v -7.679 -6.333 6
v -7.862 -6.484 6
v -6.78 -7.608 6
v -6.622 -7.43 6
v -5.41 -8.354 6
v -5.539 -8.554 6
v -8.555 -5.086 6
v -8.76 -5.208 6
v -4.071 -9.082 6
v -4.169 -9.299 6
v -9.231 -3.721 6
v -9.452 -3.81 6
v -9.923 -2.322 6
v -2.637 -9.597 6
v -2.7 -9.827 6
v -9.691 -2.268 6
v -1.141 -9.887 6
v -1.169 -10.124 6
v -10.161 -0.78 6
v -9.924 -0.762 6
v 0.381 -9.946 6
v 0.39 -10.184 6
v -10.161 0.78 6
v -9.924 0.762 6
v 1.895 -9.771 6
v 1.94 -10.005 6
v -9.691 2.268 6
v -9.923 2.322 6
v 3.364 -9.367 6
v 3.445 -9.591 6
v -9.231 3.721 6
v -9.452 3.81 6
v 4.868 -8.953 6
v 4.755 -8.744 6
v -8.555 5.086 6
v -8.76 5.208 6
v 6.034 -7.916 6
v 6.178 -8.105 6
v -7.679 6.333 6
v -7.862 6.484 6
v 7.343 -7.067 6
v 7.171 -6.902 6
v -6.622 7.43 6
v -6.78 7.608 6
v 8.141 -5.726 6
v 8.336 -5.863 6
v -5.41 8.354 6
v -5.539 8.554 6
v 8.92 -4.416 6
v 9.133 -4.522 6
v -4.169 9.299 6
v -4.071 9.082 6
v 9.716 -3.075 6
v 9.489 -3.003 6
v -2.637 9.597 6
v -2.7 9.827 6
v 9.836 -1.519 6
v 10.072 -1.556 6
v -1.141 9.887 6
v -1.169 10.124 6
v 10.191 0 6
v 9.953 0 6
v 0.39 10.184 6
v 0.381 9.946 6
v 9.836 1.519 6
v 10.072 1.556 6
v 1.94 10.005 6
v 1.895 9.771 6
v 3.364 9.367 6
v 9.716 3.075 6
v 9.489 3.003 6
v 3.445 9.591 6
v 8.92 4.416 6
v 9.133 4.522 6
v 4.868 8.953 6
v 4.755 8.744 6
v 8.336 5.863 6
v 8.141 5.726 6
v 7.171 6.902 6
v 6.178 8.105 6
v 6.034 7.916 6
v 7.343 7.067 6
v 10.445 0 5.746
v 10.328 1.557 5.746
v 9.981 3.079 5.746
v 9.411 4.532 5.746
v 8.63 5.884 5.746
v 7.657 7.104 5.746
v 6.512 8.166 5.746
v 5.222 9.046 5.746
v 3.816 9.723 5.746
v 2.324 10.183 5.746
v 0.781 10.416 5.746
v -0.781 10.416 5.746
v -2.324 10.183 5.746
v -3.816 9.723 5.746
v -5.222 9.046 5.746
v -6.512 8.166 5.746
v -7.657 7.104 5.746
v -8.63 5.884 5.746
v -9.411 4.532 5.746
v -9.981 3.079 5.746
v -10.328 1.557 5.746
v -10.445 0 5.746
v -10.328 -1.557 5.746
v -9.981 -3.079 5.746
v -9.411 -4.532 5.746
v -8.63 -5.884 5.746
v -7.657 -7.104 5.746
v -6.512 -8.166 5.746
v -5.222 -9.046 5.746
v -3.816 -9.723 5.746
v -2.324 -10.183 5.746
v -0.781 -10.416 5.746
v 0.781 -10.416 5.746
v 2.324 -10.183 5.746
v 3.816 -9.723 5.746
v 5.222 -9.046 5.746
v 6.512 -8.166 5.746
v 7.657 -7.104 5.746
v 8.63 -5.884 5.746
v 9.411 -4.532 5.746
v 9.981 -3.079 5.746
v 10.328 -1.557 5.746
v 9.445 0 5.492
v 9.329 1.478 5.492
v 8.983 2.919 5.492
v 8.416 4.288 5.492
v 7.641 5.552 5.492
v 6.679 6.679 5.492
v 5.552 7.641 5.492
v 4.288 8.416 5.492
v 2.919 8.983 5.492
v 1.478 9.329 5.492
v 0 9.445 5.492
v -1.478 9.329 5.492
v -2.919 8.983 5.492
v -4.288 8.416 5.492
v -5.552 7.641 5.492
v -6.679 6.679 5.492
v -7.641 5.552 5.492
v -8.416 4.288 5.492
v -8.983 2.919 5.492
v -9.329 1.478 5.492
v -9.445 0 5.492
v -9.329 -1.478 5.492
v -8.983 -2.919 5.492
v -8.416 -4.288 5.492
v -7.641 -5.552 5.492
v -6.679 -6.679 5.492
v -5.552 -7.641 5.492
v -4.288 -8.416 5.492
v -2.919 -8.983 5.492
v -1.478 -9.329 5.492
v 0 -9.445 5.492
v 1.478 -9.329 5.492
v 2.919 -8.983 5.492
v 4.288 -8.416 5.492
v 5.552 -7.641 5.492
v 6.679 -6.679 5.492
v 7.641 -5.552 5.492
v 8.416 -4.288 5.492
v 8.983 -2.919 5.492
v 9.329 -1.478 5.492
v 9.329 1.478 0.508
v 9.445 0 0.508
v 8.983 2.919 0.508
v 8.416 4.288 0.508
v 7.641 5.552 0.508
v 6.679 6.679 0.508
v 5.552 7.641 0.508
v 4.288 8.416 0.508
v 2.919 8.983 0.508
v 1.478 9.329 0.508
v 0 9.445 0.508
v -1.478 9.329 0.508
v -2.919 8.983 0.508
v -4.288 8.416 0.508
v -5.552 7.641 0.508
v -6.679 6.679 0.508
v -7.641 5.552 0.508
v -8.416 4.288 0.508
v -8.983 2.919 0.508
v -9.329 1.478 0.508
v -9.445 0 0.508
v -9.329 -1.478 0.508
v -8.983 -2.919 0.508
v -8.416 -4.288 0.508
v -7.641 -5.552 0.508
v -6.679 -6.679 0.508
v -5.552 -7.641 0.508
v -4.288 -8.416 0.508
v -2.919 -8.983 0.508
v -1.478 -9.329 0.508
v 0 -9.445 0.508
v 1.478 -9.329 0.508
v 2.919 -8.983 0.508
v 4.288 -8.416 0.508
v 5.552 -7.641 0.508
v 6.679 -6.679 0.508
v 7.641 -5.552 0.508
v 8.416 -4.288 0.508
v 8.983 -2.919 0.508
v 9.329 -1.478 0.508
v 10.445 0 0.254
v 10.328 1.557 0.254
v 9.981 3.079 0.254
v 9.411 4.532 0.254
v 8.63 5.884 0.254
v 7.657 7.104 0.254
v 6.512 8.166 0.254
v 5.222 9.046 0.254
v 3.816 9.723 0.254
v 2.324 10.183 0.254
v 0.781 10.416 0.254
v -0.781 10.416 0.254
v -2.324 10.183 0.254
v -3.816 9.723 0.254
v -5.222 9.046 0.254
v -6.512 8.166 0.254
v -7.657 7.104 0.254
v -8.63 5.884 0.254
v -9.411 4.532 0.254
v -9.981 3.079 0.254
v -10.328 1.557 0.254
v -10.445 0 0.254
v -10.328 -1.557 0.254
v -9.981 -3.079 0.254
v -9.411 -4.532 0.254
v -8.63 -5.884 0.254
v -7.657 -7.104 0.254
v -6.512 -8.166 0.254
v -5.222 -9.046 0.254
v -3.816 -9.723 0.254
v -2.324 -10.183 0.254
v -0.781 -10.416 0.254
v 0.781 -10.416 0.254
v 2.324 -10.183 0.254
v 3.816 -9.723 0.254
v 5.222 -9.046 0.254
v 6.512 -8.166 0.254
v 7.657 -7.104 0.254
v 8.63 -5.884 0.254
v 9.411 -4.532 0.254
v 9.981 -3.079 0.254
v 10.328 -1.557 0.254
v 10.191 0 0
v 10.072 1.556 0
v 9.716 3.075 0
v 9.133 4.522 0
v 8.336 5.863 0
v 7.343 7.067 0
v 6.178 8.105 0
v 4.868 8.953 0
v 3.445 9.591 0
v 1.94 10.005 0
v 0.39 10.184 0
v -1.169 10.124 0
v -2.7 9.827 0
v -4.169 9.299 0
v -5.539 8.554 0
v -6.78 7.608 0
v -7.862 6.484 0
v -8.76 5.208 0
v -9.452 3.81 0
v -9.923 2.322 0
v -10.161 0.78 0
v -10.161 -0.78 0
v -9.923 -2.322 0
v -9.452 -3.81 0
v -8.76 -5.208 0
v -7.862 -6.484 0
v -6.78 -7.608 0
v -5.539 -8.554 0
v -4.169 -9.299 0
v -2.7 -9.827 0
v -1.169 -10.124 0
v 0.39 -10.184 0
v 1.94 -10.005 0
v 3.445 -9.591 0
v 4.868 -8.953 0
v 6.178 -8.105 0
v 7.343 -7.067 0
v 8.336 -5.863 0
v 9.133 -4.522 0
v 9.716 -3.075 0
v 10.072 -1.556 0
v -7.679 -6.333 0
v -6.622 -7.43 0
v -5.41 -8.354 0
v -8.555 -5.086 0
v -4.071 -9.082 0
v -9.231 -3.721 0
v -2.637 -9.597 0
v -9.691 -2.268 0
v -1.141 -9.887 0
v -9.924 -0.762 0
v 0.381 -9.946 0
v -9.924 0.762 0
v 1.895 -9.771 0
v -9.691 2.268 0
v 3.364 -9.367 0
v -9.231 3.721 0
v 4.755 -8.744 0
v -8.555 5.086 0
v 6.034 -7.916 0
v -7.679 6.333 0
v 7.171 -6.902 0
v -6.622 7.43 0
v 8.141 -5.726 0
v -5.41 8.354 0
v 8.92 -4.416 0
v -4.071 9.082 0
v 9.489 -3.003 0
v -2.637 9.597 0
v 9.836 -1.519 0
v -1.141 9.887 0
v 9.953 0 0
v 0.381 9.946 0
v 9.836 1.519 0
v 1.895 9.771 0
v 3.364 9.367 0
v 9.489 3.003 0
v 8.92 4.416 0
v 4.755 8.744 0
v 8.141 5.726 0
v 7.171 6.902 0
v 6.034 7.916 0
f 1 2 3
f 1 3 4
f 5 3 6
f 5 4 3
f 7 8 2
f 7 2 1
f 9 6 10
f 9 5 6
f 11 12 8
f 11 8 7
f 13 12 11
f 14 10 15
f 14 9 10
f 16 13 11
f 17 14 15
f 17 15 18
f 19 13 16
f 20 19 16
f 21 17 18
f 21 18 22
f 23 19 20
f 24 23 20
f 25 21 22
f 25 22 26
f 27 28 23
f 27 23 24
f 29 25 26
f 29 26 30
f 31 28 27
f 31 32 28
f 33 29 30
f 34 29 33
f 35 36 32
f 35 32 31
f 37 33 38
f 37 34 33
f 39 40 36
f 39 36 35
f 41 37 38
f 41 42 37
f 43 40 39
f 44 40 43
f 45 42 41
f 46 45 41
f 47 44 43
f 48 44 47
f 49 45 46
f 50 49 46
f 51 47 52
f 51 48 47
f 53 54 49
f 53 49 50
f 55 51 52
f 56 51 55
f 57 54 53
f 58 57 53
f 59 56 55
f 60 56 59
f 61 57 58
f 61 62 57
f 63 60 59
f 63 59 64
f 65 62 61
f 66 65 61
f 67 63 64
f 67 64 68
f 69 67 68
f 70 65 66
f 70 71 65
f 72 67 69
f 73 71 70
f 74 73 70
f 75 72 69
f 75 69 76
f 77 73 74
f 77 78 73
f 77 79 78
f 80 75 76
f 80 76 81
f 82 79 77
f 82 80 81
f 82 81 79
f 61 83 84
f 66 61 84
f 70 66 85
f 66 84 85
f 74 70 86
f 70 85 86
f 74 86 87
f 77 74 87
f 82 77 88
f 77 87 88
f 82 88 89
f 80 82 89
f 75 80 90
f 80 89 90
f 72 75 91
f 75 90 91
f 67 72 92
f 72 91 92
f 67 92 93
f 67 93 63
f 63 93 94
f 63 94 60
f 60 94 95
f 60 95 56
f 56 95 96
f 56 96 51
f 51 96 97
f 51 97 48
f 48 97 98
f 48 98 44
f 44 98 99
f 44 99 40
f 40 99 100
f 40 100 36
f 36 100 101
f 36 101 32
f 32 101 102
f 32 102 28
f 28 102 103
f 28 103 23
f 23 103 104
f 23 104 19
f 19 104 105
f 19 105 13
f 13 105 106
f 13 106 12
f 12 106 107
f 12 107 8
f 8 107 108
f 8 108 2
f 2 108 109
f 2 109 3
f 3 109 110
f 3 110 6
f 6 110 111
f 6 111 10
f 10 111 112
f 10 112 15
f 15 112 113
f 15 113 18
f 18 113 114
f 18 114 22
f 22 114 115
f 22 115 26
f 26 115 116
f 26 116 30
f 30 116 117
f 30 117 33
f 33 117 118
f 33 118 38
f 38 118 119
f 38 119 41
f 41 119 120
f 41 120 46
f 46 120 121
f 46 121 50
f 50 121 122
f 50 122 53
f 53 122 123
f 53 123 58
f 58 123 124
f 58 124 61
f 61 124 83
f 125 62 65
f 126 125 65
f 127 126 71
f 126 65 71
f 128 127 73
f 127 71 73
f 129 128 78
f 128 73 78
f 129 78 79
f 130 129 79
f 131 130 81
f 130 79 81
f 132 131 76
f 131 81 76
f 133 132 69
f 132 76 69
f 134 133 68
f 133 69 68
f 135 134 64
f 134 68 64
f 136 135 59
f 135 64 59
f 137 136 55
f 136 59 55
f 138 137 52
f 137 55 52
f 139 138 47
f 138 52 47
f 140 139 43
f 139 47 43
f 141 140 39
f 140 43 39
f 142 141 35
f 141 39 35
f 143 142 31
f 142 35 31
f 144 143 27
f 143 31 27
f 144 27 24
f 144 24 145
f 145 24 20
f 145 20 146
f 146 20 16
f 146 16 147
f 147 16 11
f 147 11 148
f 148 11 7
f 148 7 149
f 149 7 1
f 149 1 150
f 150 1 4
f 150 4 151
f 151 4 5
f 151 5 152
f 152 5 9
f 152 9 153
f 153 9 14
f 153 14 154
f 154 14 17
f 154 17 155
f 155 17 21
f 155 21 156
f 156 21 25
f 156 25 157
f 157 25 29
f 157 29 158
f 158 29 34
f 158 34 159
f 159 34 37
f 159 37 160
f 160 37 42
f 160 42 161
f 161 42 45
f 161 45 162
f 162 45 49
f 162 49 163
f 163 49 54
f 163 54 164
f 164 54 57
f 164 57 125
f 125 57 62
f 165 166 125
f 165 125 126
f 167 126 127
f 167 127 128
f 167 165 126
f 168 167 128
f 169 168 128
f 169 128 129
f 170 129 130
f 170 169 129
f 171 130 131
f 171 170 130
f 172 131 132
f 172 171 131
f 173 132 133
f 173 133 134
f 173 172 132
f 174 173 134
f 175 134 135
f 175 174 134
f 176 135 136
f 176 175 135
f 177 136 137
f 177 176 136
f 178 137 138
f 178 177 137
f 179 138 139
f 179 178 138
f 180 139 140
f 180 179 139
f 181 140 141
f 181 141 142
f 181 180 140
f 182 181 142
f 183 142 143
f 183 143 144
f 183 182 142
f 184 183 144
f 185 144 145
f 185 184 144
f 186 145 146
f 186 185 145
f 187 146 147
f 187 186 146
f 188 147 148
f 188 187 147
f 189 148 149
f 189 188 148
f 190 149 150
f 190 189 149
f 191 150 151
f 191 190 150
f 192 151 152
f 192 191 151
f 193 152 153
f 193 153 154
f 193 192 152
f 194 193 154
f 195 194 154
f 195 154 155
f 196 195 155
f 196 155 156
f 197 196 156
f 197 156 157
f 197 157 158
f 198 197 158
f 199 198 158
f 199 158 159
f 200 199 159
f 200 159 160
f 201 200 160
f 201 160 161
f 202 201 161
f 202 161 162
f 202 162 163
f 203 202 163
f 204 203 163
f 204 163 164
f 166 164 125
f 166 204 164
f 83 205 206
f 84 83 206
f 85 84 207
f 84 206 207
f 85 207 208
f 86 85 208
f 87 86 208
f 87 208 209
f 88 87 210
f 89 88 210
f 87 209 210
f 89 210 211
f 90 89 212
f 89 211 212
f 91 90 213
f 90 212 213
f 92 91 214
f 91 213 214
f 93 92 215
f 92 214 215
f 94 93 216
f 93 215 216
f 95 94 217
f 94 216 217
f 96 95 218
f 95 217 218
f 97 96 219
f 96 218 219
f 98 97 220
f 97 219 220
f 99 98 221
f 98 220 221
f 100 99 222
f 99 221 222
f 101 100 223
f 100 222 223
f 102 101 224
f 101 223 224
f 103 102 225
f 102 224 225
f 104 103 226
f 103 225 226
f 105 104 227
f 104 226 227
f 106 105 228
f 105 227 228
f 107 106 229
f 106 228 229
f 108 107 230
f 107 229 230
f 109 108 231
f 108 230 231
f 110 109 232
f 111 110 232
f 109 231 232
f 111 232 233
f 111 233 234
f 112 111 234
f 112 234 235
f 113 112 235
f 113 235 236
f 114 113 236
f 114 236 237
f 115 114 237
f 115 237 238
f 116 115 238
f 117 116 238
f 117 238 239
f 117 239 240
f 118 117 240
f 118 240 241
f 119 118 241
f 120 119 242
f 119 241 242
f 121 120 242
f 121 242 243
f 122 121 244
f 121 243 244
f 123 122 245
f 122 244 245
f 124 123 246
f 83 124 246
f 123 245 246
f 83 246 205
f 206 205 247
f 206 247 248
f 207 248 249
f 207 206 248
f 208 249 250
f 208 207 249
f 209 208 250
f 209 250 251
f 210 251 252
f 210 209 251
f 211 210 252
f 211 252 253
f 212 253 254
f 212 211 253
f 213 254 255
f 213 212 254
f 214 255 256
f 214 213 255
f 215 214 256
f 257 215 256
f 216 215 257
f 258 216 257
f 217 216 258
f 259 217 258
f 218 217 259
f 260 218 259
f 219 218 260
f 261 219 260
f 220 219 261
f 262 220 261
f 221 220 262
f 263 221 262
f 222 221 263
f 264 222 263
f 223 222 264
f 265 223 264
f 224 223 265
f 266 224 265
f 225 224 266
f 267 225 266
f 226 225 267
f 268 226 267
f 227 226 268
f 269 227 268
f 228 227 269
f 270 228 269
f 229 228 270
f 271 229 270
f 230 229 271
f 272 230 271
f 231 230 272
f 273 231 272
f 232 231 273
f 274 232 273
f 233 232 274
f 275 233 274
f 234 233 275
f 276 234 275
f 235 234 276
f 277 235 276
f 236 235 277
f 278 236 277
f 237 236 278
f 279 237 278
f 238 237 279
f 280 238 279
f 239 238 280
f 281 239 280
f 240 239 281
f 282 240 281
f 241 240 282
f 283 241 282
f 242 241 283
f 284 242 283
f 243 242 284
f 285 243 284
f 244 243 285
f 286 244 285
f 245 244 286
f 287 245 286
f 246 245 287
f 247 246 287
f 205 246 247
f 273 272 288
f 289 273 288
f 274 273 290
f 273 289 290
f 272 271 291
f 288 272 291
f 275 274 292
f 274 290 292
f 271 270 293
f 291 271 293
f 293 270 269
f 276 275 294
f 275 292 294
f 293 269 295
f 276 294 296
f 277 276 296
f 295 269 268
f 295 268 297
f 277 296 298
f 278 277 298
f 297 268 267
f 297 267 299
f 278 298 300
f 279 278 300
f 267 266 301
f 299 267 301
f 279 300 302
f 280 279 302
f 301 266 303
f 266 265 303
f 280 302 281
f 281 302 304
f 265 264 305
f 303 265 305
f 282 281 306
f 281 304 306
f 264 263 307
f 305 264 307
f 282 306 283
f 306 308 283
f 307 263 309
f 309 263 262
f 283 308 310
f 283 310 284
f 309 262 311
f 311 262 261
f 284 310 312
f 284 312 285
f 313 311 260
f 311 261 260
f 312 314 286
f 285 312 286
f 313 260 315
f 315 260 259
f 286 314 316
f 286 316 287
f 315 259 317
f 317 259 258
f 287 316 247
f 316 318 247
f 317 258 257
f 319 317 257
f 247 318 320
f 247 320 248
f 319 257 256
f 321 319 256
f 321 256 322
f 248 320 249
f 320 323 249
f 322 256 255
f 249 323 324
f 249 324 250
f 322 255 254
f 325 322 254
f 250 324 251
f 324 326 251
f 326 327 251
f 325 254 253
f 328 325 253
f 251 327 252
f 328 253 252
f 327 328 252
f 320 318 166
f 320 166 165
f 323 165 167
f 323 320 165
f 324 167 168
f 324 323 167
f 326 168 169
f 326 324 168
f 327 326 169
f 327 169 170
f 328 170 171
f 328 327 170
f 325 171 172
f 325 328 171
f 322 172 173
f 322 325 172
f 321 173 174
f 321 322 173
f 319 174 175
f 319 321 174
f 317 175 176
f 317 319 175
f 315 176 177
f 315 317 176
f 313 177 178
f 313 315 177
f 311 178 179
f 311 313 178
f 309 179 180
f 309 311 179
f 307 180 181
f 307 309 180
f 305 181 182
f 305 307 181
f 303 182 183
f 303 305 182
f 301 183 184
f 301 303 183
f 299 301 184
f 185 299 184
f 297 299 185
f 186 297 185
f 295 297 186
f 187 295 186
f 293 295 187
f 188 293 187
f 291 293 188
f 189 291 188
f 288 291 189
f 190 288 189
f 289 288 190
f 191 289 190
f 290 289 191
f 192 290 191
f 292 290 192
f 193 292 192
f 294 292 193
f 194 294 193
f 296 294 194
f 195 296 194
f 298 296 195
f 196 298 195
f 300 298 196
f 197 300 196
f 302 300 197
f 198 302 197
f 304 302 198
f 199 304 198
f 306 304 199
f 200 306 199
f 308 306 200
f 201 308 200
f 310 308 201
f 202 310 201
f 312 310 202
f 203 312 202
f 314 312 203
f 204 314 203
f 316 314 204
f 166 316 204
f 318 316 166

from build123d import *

# Parameters (mm, degrees)
F0_R     = 10.445
F0_R_2   = 9.445
F1_DEPTH = 6
F2_SIZE  = 0.508
F3_SIZE  = 0.254


with BuildPart() as f1:
    # F0 (on Top) → F1 (new body)
    with BuildSketch(Plane.XY):
        Circle(F0_R)
        Circle(F0_R_2, mode=Mode.SUBTRACT)
    extrude(amount=F1_DEPTH)

    # F2
    f2_edges = [f1.edges().sort_by_distance(p)[0] for p in [
        (-9.445, 0, 6),
        (-9.445, 0, 0),
    ]]
    chamfer(f2_edges, length=F2_SIZE)

    # F3
    f3_edges = [f1.edges().sort_by_distance(p)[0] for p in [
        (-10.445, 0, 6),
        (-10.445, 0, 0),
    ]]
    chamfer(f3_edges, length=F3_SIZE)


solid = f1.part
